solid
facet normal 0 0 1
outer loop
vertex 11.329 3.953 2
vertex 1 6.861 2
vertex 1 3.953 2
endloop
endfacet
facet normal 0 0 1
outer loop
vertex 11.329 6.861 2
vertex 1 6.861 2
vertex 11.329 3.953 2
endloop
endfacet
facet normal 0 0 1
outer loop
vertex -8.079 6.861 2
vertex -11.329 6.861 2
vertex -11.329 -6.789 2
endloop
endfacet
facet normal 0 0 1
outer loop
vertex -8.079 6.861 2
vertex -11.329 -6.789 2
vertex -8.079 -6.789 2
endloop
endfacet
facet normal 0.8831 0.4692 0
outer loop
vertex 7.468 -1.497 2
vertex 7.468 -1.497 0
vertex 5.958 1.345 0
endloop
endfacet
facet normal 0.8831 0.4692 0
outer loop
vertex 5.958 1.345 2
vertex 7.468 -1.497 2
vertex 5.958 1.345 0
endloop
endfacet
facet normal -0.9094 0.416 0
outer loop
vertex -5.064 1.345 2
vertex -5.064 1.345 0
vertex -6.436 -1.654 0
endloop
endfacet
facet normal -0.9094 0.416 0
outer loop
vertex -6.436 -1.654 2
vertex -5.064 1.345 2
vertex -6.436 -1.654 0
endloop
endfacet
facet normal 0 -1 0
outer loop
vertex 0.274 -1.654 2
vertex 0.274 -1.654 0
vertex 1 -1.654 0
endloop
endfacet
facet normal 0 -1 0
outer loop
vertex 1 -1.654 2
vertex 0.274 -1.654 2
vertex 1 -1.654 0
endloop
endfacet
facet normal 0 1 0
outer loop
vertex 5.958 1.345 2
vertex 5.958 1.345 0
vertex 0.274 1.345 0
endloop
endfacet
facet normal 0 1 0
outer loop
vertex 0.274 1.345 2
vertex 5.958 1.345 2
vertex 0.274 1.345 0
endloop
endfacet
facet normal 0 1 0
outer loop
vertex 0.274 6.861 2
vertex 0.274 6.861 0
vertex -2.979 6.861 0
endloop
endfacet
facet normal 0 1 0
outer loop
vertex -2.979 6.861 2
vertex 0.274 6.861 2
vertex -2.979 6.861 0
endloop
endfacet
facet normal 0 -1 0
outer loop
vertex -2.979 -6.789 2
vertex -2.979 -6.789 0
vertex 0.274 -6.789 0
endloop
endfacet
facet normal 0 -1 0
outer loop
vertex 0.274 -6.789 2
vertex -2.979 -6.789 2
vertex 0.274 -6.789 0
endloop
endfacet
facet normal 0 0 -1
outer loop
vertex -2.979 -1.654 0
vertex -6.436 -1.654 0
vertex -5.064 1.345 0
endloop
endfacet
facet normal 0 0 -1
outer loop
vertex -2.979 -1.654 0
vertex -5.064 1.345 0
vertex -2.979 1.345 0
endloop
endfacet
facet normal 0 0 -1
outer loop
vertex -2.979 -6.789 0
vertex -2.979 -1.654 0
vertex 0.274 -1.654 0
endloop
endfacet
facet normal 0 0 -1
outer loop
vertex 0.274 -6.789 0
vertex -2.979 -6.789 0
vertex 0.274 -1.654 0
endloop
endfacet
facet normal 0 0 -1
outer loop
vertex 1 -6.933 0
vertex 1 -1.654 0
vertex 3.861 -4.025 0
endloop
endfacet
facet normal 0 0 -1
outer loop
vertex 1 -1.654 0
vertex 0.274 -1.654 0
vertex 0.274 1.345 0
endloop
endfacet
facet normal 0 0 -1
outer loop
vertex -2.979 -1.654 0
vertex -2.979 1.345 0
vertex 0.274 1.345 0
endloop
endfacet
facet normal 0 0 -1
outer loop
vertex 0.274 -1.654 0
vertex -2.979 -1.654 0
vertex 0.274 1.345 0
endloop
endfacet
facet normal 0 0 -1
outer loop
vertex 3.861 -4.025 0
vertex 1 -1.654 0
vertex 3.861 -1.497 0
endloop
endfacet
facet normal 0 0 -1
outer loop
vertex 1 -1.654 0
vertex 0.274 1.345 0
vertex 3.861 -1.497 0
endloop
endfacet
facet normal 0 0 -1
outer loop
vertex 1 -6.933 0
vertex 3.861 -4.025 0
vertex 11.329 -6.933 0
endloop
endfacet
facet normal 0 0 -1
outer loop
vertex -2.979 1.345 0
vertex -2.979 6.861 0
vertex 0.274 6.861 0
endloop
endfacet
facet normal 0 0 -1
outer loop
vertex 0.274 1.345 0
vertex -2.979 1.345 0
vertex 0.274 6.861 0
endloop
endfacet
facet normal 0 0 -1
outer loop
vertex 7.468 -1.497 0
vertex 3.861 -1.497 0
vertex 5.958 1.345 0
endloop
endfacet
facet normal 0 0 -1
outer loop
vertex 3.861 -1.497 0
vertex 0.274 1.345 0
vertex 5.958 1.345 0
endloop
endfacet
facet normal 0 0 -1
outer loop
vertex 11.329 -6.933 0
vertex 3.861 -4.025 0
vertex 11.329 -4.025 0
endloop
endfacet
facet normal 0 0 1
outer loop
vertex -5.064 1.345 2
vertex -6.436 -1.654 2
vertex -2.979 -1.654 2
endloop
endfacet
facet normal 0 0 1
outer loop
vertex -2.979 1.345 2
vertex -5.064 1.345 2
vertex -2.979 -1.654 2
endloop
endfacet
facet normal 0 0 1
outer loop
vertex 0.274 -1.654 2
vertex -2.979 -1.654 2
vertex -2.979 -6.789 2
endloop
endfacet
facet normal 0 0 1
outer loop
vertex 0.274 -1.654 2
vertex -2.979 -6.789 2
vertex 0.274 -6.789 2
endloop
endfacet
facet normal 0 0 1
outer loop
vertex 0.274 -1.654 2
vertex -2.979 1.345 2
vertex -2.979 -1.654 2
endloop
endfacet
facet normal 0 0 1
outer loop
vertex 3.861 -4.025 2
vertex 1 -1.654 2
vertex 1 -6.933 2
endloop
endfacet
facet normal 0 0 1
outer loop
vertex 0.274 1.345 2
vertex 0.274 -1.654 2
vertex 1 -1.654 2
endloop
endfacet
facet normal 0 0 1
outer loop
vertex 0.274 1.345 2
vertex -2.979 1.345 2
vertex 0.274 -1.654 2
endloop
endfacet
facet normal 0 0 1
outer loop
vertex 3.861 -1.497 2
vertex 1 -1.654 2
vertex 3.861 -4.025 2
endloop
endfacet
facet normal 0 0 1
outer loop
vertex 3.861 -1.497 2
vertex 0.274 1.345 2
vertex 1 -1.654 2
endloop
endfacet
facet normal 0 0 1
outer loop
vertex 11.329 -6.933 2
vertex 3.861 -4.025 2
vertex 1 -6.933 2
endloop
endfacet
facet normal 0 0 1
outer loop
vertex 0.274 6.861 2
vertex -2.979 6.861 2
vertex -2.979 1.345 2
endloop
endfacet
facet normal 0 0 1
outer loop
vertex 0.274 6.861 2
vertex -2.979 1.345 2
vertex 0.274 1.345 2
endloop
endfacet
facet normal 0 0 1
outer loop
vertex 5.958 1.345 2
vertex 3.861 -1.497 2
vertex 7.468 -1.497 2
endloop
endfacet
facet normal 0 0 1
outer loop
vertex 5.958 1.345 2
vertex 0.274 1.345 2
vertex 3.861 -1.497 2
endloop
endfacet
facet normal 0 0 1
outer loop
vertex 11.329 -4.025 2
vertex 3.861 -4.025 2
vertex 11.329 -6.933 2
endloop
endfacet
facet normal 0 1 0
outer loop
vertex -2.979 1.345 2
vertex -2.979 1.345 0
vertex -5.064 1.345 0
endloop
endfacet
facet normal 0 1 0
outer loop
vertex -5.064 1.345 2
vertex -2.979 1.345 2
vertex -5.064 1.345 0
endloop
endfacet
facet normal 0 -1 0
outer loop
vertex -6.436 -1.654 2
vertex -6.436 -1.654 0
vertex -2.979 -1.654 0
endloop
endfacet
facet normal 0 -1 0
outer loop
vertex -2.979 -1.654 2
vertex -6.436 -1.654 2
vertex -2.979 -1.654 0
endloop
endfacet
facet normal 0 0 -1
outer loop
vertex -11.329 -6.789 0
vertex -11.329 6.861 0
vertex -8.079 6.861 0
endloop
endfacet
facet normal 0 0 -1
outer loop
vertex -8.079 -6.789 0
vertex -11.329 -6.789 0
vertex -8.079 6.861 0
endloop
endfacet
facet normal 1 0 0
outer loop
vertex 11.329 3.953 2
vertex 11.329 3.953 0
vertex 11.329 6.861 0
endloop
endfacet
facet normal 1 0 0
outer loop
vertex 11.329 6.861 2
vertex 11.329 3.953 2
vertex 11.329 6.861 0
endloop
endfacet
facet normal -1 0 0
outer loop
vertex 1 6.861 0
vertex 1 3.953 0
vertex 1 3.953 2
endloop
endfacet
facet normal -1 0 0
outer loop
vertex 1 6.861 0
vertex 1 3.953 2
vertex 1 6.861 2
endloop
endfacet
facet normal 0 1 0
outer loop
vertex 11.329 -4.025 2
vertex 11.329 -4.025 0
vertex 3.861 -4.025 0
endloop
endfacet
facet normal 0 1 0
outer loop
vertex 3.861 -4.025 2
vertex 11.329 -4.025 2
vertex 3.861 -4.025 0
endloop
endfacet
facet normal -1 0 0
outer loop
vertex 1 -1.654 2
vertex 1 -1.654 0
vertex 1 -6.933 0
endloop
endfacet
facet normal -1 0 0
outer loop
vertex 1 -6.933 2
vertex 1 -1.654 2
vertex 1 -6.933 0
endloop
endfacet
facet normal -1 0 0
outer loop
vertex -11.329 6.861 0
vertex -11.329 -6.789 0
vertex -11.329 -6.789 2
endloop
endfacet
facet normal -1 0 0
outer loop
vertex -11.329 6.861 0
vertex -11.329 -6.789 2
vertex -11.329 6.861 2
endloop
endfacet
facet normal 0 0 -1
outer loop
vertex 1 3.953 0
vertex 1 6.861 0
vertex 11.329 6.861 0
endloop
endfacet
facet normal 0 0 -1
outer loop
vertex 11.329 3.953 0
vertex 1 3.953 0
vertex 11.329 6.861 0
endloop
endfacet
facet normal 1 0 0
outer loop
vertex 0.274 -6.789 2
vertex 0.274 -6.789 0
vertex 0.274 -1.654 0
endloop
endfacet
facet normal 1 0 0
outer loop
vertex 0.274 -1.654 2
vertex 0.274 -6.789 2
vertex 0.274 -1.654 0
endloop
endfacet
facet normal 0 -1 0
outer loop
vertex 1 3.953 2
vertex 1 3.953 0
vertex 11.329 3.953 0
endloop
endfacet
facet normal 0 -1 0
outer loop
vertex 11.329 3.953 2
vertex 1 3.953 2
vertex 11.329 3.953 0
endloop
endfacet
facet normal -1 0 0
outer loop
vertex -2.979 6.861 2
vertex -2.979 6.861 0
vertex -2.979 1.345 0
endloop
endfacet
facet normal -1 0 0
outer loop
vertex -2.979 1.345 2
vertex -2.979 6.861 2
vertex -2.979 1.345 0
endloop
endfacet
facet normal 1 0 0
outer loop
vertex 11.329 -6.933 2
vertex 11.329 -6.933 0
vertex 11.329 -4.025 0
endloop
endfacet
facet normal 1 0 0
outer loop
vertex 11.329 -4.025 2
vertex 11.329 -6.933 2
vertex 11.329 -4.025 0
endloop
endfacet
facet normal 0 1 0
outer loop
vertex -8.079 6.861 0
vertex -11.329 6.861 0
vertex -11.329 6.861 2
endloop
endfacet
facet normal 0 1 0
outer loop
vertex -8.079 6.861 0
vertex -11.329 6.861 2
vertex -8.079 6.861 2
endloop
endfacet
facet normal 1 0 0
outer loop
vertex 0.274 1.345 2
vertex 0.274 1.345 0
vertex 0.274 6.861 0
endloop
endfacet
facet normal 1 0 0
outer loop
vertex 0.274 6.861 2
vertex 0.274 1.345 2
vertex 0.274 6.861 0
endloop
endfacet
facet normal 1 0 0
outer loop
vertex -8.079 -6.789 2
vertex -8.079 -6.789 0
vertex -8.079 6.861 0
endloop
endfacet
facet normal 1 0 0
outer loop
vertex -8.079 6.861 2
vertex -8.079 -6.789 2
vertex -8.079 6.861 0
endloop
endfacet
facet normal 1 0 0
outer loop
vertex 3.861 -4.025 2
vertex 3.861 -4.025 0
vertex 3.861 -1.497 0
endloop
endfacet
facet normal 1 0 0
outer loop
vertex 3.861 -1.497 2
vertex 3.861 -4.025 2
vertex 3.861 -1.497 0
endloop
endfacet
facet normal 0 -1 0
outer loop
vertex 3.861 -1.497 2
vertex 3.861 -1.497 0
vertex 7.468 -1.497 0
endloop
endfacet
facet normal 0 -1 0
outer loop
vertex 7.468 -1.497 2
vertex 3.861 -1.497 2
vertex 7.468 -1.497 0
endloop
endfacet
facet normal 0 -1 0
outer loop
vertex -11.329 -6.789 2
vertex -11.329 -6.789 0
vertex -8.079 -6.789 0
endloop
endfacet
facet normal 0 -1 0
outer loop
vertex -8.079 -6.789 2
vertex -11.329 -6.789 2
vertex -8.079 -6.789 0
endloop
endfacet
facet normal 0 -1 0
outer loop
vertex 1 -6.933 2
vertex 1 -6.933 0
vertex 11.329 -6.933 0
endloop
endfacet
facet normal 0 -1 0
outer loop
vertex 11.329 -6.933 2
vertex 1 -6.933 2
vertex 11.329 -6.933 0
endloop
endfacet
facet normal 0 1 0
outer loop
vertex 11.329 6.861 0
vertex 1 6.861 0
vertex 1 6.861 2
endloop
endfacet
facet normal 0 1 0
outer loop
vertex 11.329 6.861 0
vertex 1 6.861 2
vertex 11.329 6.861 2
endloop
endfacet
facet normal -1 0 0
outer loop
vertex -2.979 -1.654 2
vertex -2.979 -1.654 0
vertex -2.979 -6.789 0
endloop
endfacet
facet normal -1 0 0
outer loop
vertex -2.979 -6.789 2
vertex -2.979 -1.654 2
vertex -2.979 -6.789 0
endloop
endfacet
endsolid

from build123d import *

# Parameters (mm, degrees)
BOSS_EXTRUDE1_DEPTH   = 2
SKETCH1_W             = 2.5
SKETCH1_H             = 10.5
BOSS_EXTRUDE1_2_DEPTH = 2
SKETCH1_W_2           = 7.945592629
SKETCH1_H_2           = 2.237026011
BOSS_EXTRUDE1_3_DEPTH = 2
SCALE2_SCALE          = 1.3
SKETCH2_W             = 28.996582699
SKETCH2_H             = 17.123330173
CUT_EXTRUDE1_DEPTH    = 0.6


with BuildPart() as part:
    # Sketch1 → Boss-Extrude1 (new body)
    with BuildSketch(Plane.XY):
        Polygon((-3.895135439, 1.034757073), (-4.950527249, -1.272027883), (-3.855272926, -1.272027883), (-2.291707931, -1.272027883), (-2.291707931, -5.222208659), (0.211078362, -5.222208659), (0.211078362, -1.272027883), (0.768928319, -1.272027883), (0.768928319, -5.333374023), (8.714520948, -5.333374023), (8.714520948, -3.096348012), (2.970174095, -3.096348012), (2.970174095, -1.151411676), (4.583415862, -1.151411676), (5.744346853, -1.151411676), (4.583415862, 1.034757073), (2.970174095, 1.034757073), (0.768928319, 1.034757073), (0.211078362, 1.034757073), (0.211078362, 5.277791341), (-2.291707931, 5.277791341), (-2.291707931, 1.034757073), align=None)
    extrude(amount=BOSS_EXTRUDE1_DEPTH)


with BuildPart() as body_2:
    # Sketch1 → Boss-Extrude1 2 (new body)
    with BuildSketch(Plane.XY):
        with Locations((-7.464520948, 0.027791341)):
            Rectangle(SKETCH1_W, SKETCH1_H)
    extrude(amount=BOSS_EXTRUDE1_2_DEPTH)


with BuildPart() as body_3:
    # Sketch1 → Boss-Extrude1 3 (new body)
    with BuildSketch(Plane.XY):
        with Locations((4.741724634, 4.159278335)):
            Rectangle(SKETCH1_W_2, SKETCH1_H_2)
    extrude(amount=BOSS_EXTRUDE1_3_DEPTH)


with BuildPart() as body_2_1:
    # Scale2: scaled about (0, 0, 0)
    add(body_2.part.scale(SCALE2_SCALE))


with BuildPart() as part_1:
    # Scale2: scaled about (0, 0, 0)
    add(part.part.scale(SCALE2_SCALE))


with BuildPart() as body_3_1:
    # Scale2: scaled about (0, 0, 0)
    add(body_3.part.scale(SCALE2_SCALE))


with BuildPart() as cut_extrude1_tool:
    # Sketch2 → Cut-Extrude1 (new body)
    with BuildSketch(Plane.XY.offset(2.6)):
        with Locations((-0.525007764, 0.222336618)):
            Rectangle(SKETCH2_W, SKETCH2_H)
    extrude(amount=-CUT_EXTRUDE1_DEPTH)


with BuildPart() as part_2:
    add(part_1.part)

    # Cut-Extrude1: cut by cut_extrude1_tool
    add(cut_extrude1_tool.part, mode=Mode.SUBTRACT)


with BuildPart() as body_2_2:
    add(body_2_1.part)

    # Cut-Extrude1: cut by cut_extrude1_tool
    add(cut_extrude1_tool.part, mode=Mode.SUBTRACT)


with BuildPart() as body_3_2:
    add(body_3_1.part)

    # Cut-Extrude1: cut by cut_extrude1_tool
    add(cut_extrude1_tool.part, mode=Mode.SUBTRACT)


solid = Compound([part_2.part, body_2_2.part, body_3_2.part])
